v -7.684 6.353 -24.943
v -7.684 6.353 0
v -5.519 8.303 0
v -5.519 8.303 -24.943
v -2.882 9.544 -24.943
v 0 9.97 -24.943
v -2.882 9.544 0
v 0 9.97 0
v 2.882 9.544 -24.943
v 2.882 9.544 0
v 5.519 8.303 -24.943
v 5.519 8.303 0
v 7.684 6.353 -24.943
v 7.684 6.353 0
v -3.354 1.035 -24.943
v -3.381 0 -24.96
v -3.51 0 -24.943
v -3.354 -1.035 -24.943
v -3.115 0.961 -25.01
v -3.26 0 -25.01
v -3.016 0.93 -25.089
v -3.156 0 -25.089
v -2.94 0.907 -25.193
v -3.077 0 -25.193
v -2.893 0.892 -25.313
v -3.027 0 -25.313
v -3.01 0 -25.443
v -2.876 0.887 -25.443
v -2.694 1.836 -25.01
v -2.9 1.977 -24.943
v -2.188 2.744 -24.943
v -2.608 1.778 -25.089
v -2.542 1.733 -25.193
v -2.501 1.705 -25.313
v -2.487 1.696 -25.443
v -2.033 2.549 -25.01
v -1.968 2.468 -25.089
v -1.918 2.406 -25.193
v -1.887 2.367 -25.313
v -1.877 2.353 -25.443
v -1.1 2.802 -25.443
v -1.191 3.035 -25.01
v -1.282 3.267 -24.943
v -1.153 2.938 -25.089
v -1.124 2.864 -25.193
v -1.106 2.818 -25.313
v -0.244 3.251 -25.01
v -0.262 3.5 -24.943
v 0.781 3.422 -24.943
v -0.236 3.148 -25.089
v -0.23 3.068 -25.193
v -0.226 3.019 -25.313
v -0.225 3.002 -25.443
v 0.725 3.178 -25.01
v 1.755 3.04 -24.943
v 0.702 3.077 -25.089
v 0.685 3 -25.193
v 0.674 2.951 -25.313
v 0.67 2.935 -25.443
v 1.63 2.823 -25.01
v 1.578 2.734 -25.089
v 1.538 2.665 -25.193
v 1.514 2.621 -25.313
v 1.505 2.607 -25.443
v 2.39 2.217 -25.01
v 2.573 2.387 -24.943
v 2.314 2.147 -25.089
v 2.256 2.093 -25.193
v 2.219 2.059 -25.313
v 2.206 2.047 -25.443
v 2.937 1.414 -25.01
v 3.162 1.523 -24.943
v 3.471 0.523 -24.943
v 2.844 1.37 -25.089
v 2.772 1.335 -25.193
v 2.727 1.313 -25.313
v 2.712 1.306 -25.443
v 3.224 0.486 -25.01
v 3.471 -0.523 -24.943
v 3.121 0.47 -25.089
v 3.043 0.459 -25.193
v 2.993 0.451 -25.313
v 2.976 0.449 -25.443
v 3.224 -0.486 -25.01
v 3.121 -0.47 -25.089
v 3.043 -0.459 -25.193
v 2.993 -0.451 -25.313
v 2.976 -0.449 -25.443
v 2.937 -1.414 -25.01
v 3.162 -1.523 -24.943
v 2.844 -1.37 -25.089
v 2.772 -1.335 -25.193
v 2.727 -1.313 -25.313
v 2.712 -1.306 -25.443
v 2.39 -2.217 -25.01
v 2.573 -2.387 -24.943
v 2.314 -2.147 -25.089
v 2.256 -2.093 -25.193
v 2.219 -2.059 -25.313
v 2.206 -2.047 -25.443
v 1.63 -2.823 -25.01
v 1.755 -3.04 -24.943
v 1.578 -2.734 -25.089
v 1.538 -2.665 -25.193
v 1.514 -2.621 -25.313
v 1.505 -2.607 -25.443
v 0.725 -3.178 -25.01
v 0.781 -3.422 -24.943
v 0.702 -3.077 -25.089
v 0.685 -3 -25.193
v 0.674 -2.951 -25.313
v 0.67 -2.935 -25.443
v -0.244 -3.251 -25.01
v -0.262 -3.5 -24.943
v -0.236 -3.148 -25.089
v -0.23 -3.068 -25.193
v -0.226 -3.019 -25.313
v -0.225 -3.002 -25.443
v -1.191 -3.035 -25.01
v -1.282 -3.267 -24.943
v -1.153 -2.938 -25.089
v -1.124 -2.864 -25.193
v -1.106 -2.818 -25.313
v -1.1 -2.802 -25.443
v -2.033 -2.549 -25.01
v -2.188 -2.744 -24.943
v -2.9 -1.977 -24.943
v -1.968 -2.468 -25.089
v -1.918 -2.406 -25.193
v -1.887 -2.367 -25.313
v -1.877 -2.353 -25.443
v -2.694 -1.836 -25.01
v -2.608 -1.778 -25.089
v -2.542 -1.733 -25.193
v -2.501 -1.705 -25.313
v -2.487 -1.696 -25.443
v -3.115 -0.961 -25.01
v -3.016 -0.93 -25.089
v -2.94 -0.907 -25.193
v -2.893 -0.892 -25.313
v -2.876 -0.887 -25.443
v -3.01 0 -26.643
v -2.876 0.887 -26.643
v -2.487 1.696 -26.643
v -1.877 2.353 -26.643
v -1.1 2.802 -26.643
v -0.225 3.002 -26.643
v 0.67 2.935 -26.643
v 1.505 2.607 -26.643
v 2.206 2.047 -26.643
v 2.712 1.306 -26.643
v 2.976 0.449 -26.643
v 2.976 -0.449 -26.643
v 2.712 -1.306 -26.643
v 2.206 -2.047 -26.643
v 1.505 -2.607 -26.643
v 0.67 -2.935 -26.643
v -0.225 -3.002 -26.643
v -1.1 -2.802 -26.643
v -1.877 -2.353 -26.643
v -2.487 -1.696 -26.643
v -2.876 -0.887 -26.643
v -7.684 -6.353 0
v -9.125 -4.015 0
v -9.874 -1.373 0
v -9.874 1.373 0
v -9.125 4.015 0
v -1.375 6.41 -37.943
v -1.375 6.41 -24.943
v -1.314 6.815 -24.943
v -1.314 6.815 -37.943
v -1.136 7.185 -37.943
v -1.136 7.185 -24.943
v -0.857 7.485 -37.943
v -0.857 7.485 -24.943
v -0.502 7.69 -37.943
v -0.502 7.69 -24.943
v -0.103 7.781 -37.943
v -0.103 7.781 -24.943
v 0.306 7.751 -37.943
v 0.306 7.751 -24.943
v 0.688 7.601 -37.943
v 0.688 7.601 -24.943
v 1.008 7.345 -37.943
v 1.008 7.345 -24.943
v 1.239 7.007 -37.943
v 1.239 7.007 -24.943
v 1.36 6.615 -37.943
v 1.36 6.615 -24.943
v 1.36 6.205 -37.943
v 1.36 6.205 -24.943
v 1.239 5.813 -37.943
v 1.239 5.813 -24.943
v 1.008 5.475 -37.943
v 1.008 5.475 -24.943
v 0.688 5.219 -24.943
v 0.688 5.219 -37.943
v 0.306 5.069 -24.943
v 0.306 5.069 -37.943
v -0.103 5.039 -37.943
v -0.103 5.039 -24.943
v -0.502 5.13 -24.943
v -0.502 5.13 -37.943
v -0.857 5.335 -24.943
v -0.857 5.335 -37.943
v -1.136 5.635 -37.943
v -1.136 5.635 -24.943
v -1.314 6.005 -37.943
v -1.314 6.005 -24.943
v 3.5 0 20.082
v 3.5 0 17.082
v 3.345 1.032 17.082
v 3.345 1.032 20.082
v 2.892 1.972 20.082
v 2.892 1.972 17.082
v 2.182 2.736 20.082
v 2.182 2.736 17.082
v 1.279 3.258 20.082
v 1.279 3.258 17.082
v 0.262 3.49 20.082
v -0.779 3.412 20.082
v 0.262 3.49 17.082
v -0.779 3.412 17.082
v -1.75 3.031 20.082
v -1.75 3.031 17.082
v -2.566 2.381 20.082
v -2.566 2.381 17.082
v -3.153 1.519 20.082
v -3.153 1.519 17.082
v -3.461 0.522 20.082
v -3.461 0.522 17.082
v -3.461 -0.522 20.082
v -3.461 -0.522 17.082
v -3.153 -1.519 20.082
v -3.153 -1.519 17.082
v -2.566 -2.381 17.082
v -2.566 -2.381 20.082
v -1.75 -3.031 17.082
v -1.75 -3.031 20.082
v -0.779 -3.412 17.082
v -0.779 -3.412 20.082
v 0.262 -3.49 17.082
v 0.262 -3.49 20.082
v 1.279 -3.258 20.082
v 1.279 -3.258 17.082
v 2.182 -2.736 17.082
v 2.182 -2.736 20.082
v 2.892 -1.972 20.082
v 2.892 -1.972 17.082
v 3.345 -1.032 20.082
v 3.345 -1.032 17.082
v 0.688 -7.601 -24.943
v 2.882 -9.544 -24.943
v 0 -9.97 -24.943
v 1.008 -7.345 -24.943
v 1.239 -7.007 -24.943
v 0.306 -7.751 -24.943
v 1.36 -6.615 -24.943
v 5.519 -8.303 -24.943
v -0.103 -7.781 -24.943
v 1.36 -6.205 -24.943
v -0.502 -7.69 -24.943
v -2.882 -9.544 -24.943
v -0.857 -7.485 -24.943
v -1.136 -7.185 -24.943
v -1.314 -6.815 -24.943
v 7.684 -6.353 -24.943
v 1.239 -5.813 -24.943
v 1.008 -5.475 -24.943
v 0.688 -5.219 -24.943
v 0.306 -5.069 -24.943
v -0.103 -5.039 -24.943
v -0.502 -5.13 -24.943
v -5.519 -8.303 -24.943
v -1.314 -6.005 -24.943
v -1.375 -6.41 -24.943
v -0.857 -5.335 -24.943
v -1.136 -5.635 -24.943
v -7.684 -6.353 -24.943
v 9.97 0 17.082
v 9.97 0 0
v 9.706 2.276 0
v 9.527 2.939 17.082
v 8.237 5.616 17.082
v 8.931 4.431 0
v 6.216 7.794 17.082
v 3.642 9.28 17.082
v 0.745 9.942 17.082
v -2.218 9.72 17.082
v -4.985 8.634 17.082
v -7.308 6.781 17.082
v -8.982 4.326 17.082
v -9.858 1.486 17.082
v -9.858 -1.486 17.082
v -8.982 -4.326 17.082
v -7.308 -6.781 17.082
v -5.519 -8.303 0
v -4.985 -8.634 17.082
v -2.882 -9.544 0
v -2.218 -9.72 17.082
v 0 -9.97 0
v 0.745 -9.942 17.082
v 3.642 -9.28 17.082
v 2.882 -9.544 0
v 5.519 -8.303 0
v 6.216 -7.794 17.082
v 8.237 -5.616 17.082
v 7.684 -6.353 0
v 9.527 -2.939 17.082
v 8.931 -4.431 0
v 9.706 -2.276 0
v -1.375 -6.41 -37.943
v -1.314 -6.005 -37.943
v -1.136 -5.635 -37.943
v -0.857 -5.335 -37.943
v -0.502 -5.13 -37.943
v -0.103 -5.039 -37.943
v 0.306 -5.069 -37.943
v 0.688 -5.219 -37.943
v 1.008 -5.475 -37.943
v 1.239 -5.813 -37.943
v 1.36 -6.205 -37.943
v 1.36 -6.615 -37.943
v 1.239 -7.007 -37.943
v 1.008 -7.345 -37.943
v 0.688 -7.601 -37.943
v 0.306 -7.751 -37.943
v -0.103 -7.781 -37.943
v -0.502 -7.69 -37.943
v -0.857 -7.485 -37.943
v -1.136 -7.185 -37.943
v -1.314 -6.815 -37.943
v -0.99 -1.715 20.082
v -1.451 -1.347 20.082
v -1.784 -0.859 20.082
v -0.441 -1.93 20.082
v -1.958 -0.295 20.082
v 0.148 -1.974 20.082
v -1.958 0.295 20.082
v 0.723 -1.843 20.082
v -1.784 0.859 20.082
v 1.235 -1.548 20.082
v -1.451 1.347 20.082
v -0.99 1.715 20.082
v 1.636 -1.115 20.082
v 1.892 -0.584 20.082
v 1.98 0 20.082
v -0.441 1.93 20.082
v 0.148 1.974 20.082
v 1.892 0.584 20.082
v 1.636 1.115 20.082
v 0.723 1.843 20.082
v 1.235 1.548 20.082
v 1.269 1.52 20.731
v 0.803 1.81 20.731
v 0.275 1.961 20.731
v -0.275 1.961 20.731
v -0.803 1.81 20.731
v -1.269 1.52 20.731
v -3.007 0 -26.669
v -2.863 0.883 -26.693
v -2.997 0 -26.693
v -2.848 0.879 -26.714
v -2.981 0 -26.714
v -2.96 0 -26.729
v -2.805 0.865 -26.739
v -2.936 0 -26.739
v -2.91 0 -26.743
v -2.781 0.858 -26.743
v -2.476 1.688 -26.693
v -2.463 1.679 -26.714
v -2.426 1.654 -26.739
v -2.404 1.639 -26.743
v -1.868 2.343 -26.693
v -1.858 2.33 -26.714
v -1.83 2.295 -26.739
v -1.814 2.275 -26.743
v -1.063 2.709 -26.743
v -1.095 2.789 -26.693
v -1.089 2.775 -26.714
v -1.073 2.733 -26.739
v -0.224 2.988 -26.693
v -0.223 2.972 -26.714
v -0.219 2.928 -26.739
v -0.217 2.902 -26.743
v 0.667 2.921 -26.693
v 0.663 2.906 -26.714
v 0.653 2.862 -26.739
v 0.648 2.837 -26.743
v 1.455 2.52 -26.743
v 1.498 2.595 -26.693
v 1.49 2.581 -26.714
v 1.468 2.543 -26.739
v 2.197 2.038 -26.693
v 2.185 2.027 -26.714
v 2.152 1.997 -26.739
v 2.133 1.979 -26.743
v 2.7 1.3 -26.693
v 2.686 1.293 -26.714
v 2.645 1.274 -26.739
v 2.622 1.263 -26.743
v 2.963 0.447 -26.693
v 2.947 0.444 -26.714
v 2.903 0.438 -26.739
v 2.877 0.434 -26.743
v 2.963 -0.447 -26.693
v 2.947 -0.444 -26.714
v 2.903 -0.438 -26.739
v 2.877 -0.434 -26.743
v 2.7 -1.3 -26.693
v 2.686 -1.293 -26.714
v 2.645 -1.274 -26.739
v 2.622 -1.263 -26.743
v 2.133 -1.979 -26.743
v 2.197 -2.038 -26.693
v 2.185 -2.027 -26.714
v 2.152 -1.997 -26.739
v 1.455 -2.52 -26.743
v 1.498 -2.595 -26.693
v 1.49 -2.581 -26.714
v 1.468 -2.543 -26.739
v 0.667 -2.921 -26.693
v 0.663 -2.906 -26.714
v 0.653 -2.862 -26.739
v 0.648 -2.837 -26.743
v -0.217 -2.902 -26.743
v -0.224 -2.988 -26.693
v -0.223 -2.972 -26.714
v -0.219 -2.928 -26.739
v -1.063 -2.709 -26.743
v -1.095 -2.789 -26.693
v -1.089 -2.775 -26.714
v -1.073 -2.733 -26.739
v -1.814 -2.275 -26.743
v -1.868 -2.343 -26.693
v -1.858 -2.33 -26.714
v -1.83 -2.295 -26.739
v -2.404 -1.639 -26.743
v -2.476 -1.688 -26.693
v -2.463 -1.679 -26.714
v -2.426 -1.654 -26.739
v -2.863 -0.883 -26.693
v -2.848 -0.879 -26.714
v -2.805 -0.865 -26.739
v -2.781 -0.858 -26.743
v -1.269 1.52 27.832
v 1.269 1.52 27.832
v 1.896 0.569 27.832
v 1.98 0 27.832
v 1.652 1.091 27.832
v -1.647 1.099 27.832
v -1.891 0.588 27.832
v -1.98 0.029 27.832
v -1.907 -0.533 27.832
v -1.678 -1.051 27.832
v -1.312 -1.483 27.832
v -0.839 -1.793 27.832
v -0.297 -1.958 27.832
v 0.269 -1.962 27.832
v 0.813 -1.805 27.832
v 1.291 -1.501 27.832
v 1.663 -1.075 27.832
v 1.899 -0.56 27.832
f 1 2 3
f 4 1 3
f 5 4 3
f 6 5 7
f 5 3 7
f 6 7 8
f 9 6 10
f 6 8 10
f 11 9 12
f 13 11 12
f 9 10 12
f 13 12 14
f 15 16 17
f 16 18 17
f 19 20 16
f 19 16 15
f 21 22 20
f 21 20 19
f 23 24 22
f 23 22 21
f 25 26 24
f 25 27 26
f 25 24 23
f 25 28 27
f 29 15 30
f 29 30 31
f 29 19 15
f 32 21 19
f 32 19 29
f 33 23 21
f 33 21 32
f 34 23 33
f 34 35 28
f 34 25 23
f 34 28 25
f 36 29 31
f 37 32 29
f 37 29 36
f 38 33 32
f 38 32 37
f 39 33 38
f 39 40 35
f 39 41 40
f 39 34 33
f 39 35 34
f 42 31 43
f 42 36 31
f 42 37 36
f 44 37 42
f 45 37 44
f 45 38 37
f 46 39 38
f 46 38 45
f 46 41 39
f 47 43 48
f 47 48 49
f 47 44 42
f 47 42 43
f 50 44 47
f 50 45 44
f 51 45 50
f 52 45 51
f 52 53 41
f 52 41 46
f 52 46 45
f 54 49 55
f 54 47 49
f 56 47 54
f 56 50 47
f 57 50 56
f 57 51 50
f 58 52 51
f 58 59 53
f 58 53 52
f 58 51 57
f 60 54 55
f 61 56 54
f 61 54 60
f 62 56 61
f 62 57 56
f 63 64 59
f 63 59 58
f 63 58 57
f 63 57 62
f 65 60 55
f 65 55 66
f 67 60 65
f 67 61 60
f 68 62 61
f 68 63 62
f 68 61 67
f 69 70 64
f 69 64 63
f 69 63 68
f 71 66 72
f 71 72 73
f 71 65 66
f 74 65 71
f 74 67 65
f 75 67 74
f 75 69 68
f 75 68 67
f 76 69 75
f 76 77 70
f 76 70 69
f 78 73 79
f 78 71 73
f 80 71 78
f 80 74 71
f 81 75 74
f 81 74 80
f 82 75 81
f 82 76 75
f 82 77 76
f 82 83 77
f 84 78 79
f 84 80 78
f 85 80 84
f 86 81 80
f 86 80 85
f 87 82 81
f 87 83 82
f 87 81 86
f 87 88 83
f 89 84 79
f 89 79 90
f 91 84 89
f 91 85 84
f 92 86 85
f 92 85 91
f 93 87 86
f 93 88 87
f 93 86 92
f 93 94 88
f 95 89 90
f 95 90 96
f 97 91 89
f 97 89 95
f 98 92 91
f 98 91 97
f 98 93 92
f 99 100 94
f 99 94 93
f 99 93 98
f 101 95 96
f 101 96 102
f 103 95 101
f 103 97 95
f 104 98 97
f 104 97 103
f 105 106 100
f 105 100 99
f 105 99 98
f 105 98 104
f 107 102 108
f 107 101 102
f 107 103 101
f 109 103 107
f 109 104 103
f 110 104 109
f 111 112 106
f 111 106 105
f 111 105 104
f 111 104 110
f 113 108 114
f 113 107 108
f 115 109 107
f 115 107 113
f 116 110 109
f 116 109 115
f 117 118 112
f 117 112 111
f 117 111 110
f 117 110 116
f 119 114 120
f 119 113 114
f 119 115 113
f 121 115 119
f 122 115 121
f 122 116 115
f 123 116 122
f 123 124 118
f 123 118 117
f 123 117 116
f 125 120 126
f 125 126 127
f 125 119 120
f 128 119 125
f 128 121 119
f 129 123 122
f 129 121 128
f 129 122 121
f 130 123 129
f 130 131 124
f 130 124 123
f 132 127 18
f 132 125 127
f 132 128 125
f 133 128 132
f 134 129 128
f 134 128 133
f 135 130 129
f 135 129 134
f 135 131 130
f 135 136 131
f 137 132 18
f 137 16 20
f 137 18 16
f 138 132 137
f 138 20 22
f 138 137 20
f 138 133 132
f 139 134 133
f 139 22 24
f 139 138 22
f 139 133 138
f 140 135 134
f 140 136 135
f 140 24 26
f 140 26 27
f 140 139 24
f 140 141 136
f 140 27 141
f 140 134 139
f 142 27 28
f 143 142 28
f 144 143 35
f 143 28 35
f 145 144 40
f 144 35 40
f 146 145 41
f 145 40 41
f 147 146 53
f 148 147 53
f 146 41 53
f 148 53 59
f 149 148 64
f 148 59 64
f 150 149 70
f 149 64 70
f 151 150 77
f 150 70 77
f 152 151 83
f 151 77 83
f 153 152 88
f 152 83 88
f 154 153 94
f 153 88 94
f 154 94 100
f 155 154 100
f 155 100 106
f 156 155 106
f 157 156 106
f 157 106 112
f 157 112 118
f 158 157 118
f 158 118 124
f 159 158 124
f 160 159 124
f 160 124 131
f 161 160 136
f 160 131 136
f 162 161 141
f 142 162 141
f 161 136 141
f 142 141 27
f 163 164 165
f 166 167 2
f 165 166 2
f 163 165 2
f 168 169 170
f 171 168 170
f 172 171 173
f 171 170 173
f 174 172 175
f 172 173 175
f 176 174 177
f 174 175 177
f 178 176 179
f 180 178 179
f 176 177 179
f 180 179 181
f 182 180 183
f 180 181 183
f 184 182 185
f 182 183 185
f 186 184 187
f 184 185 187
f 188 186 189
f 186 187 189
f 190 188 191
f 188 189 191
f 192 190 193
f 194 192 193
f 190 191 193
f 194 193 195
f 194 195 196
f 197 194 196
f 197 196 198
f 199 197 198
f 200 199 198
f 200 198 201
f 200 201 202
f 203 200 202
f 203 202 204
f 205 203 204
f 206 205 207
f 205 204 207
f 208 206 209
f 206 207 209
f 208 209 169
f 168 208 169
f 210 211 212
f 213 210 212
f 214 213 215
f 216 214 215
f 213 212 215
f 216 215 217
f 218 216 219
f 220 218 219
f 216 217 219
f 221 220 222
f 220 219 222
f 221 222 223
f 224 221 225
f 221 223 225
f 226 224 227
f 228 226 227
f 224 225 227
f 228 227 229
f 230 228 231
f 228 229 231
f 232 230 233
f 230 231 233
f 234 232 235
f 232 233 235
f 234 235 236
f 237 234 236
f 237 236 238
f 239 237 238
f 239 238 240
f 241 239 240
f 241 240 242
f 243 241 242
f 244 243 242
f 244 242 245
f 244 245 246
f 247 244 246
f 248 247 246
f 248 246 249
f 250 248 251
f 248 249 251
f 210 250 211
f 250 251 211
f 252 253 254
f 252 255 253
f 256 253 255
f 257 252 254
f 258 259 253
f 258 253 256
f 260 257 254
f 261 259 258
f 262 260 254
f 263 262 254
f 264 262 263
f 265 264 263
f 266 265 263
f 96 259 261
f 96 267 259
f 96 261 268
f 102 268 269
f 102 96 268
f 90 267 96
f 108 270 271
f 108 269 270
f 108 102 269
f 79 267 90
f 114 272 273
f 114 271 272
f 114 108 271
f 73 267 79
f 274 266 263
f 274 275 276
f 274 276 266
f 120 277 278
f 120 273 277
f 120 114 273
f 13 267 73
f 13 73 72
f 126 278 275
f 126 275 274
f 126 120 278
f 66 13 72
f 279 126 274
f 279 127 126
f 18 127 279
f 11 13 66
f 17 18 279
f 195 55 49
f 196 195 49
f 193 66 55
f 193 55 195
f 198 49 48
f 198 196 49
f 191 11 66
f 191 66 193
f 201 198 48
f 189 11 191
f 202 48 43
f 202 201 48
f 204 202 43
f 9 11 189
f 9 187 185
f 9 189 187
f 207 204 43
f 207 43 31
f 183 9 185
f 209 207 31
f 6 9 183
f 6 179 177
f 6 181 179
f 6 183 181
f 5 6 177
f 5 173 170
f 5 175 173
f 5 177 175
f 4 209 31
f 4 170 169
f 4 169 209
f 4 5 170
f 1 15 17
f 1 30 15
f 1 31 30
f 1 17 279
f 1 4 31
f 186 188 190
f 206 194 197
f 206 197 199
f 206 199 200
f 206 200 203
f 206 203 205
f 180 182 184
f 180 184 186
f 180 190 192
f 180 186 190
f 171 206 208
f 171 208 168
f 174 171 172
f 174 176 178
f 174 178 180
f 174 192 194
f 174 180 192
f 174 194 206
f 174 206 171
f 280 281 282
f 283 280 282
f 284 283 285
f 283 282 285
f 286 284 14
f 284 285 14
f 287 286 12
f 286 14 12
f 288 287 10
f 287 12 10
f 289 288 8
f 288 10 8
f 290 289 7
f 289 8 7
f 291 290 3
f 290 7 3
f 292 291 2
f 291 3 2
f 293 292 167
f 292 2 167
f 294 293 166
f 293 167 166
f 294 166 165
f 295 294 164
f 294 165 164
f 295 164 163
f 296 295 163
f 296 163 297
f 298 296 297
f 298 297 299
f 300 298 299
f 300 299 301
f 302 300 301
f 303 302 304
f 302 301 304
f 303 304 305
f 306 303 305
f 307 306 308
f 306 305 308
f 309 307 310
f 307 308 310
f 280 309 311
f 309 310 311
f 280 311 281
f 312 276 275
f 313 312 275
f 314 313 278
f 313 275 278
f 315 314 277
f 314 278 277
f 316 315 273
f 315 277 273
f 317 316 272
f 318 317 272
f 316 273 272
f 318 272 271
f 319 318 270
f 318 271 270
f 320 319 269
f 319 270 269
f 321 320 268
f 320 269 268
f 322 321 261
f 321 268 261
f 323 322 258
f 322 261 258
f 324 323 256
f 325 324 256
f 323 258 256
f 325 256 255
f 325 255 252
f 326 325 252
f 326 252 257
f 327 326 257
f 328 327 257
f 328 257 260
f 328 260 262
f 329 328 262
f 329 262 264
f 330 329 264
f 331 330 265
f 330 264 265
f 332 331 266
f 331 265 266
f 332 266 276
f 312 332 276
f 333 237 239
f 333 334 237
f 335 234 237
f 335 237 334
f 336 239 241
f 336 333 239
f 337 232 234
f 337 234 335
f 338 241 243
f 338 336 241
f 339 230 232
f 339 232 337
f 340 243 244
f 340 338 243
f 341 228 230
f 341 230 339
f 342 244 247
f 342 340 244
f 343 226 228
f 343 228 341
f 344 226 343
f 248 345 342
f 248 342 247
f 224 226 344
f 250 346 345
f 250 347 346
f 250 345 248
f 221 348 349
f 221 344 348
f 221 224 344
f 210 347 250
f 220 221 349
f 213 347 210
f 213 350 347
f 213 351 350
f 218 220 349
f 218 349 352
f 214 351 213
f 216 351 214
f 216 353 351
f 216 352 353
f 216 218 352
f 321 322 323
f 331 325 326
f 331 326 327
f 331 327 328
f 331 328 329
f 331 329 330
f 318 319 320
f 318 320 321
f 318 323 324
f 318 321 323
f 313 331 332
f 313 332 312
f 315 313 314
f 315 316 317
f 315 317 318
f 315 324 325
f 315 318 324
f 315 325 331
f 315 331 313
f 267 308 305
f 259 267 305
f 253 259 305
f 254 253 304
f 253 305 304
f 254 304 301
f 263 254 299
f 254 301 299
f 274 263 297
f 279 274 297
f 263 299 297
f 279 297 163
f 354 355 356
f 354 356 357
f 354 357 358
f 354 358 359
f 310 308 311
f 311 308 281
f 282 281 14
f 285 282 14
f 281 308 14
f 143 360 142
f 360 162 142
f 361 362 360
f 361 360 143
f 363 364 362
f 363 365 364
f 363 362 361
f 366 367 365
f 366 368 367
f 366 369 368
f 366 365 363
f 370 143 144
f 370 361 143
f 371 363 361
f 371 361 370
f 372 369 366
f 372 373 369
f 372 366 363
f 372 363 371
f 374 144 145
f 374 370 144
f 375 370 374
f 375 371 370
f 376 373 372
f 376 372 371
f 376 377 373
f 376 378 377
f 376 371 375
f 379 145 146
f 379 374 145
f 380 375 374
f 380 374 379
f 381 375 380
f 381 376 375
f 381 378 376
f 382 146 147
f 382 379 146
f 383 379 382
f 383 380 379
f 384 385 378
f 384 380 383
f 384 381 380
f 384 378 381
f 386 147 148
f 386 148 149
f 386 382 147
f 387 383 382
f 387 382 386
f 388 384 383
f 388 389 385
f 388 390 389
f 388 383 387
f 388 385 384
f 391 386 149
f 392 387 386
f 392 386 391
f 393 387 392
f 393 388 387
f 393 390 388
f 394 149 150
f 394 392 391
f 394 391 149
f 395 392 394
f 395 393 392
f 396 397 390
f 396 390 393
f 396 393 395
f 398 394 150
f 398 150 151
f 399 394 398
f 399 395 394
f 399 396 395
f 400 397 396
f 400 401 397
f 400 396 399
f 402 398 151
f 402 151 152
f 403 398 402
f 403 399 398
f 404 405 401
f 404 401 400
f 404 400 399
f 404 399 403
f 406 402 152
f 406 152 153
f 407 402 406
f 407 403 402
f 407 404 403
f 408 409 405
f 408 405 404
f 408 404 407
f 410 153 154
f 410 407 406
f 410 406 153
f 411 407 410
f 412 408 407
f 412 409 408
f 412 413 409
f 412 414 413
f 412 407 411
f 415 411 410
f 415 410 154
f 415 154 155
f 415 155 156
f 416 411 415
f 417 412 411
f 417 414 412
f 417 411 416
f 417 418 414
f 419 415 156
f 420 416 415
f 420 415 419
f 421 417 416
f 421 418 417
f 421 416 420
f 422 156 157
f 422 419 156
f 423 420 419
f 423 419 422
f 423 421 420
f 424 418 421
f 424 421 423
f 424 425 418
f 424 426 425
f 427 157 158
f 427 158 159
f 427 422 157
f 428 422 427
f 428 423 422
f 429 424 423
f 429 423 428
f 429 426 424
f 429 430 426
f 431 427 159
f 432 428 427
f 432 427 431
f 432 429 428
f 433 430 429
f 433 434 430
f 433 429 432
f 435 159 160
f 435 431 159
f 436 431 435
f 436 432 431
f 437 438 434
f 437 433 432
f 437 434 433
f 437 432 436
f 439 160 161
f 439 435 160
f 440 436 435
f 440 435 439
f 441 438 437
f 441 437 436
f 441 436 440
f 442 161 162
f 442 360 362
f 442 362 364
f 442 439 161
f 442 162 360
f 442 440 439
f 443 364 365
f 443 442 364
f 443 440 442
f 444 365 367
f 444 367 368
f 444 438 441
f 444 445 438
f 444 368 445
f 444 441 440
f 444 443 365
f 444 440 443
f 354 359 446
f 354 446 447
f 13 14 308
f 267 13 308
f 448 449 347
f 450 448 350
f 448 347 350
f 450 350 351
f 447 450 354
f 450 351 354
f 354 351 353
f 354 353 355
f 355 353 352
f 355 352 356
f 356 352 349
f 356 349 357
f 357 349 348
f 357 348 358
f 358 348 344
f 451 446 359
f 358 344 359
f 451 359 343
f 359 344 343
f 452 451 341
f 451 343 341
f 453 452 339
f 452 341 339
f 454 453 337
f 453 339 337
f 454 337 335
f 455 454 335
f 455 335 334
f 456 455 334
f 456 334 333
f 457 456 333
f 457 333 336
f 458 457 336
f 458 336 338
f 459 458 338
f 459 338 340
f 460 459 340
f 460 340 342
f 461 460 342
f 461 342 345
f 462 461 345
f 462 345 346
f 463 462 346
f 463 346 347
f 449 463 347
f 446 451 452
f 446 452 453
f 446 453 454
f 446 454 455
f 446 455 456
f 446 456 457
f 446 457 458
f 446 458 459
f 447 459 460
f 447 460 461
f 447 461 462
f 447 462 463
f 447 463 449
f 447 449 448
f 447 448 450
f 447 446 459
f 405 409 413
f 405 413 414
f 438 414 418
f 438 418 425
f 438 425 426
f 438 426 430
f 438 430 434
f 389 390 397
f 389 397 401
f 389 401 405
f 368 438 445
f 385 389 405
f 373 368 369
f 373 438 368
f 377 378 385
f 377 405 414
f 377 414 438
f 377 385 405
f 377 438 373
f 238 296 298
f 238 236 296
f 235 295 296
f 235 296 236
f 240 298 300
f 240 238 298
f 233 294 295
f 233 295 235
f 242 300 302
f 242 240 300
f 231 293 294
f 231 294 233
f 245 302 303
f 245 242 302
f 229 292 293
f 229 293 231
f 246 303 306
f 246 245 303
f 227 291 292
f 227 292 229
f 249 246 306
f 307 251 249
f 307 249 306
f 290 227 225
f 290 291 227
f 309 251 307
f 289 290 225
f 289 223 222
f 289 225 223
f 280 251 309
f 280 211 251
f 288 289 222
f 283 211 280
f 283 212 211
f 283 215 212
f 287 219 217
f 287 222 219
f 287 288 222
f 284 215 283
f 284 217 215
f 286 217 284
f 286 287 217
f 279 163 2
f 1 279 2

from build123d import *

# Parameters (mm, degrees)
SKETCH1_R           = 9.9695
BOSS_EXTRUDE1_DEPTH = 17.0815
BOSS_EXTRUDE2_DEPTH = 24.9428
SKETCH3_R           = 3.5
BOSS_EXTRUDE3_DEPTH = 3
SKETCH4_R           = 1.98
BOSS_EXTRUDE4_DEPTH = 7.75
CUT_EXTRUDE1_DEPTH  = 7.1
SKETCH6_R           = 3.01
BOSS_EXTRUDE5_DEPTH = 1.8
FILLET1_R           = 0.5
FILLET2_R           = 0.1
SKETCH7_R           = 1.375
BOSS_EXTRUDE6_DEPTH = 13


with BuildPart() as part:
    # Sketch1 → Boss-Extrude1 (new body)
    with BuildSketch(Plane.XY):
        Circle(SKETCH1_R)
    extrude(amount=BOSS_EXTRUDE1_DEPTH)

    # Sketch2 → Boss-Extrude2 (add)
    with BuildSketch(Plane(origin=(0, 0, 0), x_dir=(-1, 0, 0), z_dir=(0, 0, -1))):
        with BuildLine():
            Line((-7.6835, 6.352539492), (-7.6835, -6.352539492))
            ThreePointArc((-7.6835, -6.352539492), (0, -9.9695), (7.6835, -6.352539492))
            Line((7.6835, -6.352539492), (7.6835, 6.352539492))
            ThreePointArc((7.6835, 6.352539492), (0, 9.9695), (-7.6835, 6.352539492))
        make_face()
    extrude(amount=BOSS_EXTRUDE2_DEPTH)

    # Sketch3 → Boss-Extrude3 (add)
    with BuildSketch(Plane.XY.offset(17.0815)):
        Circle(SKETCH3_R)
    extrude(amount=BOSS_EXTRUDE3_DEPTH)

    # Sketch4 → Boss-Extrude4 (add)
    with BuildSketch(Plane.XY.offset(20.0815)):
        Circle(SKETCH4_R)
    extrude(amount=BOSS_EXTRUDE4_DEPTH)

    # Sketch5 → Cut-Extrude1 (cut)
    with BuildSketch(Plane.XY.offset(27.8315)):
        with BuildLine():
            Line((-1.268857754, 1.52), (1.268857754, 1.52))
            ThreePointArc((1.268857754, 1.52), (0, 1.98), (-1.268857754, 1.52))
        make_face()
    extrude(amount=-CUT_EXTRUDE1_DEPTH, mode=Mode.SUBTRACT)

    # Sketch6 → Boss-Extrude5 (add)
    with BuildSketch(Plane(origin=(0, 0, -24.9428), x_dir=(-1, 0, 0), z_dir=(0, 0, -1))):
        Circle(SKETCH6_R)
    extrude(amount=BOSS_EXTRUDE5_DEPTH)

    # Fillet1
    fillet1_edges = [part.edges().sort_by_distance(p)[0] for p in [
        (3.01, 0, -24.9428),
    ]]
    fillet(fillet1_edges, radius=FILLET1_R)

    # Fillet2
    fillet2_edges = [part.edges().sort_by_distance(p)[0] for p in [
        (3.01, 0, -26.7428),
    ]]
    fillet(fillet2_edges, radius=FILLET2_R)

    # Sketch7 → Boss-Extrude6 (add)
    with BuildSketch(Plane(origin=(0, 0, -24.9428), x_dir=(-1, 0, 0), z_dir=(0, 0, -1))):
        with Locations((0, 6.41)):
            Circle(SKETCH7_R)
        with Locations((0, -6.41)):
            Circle(SKETCH7_R)
    extrude(amount=BOSS_EXTRUDE6_DEPTH)


solid = part.part
